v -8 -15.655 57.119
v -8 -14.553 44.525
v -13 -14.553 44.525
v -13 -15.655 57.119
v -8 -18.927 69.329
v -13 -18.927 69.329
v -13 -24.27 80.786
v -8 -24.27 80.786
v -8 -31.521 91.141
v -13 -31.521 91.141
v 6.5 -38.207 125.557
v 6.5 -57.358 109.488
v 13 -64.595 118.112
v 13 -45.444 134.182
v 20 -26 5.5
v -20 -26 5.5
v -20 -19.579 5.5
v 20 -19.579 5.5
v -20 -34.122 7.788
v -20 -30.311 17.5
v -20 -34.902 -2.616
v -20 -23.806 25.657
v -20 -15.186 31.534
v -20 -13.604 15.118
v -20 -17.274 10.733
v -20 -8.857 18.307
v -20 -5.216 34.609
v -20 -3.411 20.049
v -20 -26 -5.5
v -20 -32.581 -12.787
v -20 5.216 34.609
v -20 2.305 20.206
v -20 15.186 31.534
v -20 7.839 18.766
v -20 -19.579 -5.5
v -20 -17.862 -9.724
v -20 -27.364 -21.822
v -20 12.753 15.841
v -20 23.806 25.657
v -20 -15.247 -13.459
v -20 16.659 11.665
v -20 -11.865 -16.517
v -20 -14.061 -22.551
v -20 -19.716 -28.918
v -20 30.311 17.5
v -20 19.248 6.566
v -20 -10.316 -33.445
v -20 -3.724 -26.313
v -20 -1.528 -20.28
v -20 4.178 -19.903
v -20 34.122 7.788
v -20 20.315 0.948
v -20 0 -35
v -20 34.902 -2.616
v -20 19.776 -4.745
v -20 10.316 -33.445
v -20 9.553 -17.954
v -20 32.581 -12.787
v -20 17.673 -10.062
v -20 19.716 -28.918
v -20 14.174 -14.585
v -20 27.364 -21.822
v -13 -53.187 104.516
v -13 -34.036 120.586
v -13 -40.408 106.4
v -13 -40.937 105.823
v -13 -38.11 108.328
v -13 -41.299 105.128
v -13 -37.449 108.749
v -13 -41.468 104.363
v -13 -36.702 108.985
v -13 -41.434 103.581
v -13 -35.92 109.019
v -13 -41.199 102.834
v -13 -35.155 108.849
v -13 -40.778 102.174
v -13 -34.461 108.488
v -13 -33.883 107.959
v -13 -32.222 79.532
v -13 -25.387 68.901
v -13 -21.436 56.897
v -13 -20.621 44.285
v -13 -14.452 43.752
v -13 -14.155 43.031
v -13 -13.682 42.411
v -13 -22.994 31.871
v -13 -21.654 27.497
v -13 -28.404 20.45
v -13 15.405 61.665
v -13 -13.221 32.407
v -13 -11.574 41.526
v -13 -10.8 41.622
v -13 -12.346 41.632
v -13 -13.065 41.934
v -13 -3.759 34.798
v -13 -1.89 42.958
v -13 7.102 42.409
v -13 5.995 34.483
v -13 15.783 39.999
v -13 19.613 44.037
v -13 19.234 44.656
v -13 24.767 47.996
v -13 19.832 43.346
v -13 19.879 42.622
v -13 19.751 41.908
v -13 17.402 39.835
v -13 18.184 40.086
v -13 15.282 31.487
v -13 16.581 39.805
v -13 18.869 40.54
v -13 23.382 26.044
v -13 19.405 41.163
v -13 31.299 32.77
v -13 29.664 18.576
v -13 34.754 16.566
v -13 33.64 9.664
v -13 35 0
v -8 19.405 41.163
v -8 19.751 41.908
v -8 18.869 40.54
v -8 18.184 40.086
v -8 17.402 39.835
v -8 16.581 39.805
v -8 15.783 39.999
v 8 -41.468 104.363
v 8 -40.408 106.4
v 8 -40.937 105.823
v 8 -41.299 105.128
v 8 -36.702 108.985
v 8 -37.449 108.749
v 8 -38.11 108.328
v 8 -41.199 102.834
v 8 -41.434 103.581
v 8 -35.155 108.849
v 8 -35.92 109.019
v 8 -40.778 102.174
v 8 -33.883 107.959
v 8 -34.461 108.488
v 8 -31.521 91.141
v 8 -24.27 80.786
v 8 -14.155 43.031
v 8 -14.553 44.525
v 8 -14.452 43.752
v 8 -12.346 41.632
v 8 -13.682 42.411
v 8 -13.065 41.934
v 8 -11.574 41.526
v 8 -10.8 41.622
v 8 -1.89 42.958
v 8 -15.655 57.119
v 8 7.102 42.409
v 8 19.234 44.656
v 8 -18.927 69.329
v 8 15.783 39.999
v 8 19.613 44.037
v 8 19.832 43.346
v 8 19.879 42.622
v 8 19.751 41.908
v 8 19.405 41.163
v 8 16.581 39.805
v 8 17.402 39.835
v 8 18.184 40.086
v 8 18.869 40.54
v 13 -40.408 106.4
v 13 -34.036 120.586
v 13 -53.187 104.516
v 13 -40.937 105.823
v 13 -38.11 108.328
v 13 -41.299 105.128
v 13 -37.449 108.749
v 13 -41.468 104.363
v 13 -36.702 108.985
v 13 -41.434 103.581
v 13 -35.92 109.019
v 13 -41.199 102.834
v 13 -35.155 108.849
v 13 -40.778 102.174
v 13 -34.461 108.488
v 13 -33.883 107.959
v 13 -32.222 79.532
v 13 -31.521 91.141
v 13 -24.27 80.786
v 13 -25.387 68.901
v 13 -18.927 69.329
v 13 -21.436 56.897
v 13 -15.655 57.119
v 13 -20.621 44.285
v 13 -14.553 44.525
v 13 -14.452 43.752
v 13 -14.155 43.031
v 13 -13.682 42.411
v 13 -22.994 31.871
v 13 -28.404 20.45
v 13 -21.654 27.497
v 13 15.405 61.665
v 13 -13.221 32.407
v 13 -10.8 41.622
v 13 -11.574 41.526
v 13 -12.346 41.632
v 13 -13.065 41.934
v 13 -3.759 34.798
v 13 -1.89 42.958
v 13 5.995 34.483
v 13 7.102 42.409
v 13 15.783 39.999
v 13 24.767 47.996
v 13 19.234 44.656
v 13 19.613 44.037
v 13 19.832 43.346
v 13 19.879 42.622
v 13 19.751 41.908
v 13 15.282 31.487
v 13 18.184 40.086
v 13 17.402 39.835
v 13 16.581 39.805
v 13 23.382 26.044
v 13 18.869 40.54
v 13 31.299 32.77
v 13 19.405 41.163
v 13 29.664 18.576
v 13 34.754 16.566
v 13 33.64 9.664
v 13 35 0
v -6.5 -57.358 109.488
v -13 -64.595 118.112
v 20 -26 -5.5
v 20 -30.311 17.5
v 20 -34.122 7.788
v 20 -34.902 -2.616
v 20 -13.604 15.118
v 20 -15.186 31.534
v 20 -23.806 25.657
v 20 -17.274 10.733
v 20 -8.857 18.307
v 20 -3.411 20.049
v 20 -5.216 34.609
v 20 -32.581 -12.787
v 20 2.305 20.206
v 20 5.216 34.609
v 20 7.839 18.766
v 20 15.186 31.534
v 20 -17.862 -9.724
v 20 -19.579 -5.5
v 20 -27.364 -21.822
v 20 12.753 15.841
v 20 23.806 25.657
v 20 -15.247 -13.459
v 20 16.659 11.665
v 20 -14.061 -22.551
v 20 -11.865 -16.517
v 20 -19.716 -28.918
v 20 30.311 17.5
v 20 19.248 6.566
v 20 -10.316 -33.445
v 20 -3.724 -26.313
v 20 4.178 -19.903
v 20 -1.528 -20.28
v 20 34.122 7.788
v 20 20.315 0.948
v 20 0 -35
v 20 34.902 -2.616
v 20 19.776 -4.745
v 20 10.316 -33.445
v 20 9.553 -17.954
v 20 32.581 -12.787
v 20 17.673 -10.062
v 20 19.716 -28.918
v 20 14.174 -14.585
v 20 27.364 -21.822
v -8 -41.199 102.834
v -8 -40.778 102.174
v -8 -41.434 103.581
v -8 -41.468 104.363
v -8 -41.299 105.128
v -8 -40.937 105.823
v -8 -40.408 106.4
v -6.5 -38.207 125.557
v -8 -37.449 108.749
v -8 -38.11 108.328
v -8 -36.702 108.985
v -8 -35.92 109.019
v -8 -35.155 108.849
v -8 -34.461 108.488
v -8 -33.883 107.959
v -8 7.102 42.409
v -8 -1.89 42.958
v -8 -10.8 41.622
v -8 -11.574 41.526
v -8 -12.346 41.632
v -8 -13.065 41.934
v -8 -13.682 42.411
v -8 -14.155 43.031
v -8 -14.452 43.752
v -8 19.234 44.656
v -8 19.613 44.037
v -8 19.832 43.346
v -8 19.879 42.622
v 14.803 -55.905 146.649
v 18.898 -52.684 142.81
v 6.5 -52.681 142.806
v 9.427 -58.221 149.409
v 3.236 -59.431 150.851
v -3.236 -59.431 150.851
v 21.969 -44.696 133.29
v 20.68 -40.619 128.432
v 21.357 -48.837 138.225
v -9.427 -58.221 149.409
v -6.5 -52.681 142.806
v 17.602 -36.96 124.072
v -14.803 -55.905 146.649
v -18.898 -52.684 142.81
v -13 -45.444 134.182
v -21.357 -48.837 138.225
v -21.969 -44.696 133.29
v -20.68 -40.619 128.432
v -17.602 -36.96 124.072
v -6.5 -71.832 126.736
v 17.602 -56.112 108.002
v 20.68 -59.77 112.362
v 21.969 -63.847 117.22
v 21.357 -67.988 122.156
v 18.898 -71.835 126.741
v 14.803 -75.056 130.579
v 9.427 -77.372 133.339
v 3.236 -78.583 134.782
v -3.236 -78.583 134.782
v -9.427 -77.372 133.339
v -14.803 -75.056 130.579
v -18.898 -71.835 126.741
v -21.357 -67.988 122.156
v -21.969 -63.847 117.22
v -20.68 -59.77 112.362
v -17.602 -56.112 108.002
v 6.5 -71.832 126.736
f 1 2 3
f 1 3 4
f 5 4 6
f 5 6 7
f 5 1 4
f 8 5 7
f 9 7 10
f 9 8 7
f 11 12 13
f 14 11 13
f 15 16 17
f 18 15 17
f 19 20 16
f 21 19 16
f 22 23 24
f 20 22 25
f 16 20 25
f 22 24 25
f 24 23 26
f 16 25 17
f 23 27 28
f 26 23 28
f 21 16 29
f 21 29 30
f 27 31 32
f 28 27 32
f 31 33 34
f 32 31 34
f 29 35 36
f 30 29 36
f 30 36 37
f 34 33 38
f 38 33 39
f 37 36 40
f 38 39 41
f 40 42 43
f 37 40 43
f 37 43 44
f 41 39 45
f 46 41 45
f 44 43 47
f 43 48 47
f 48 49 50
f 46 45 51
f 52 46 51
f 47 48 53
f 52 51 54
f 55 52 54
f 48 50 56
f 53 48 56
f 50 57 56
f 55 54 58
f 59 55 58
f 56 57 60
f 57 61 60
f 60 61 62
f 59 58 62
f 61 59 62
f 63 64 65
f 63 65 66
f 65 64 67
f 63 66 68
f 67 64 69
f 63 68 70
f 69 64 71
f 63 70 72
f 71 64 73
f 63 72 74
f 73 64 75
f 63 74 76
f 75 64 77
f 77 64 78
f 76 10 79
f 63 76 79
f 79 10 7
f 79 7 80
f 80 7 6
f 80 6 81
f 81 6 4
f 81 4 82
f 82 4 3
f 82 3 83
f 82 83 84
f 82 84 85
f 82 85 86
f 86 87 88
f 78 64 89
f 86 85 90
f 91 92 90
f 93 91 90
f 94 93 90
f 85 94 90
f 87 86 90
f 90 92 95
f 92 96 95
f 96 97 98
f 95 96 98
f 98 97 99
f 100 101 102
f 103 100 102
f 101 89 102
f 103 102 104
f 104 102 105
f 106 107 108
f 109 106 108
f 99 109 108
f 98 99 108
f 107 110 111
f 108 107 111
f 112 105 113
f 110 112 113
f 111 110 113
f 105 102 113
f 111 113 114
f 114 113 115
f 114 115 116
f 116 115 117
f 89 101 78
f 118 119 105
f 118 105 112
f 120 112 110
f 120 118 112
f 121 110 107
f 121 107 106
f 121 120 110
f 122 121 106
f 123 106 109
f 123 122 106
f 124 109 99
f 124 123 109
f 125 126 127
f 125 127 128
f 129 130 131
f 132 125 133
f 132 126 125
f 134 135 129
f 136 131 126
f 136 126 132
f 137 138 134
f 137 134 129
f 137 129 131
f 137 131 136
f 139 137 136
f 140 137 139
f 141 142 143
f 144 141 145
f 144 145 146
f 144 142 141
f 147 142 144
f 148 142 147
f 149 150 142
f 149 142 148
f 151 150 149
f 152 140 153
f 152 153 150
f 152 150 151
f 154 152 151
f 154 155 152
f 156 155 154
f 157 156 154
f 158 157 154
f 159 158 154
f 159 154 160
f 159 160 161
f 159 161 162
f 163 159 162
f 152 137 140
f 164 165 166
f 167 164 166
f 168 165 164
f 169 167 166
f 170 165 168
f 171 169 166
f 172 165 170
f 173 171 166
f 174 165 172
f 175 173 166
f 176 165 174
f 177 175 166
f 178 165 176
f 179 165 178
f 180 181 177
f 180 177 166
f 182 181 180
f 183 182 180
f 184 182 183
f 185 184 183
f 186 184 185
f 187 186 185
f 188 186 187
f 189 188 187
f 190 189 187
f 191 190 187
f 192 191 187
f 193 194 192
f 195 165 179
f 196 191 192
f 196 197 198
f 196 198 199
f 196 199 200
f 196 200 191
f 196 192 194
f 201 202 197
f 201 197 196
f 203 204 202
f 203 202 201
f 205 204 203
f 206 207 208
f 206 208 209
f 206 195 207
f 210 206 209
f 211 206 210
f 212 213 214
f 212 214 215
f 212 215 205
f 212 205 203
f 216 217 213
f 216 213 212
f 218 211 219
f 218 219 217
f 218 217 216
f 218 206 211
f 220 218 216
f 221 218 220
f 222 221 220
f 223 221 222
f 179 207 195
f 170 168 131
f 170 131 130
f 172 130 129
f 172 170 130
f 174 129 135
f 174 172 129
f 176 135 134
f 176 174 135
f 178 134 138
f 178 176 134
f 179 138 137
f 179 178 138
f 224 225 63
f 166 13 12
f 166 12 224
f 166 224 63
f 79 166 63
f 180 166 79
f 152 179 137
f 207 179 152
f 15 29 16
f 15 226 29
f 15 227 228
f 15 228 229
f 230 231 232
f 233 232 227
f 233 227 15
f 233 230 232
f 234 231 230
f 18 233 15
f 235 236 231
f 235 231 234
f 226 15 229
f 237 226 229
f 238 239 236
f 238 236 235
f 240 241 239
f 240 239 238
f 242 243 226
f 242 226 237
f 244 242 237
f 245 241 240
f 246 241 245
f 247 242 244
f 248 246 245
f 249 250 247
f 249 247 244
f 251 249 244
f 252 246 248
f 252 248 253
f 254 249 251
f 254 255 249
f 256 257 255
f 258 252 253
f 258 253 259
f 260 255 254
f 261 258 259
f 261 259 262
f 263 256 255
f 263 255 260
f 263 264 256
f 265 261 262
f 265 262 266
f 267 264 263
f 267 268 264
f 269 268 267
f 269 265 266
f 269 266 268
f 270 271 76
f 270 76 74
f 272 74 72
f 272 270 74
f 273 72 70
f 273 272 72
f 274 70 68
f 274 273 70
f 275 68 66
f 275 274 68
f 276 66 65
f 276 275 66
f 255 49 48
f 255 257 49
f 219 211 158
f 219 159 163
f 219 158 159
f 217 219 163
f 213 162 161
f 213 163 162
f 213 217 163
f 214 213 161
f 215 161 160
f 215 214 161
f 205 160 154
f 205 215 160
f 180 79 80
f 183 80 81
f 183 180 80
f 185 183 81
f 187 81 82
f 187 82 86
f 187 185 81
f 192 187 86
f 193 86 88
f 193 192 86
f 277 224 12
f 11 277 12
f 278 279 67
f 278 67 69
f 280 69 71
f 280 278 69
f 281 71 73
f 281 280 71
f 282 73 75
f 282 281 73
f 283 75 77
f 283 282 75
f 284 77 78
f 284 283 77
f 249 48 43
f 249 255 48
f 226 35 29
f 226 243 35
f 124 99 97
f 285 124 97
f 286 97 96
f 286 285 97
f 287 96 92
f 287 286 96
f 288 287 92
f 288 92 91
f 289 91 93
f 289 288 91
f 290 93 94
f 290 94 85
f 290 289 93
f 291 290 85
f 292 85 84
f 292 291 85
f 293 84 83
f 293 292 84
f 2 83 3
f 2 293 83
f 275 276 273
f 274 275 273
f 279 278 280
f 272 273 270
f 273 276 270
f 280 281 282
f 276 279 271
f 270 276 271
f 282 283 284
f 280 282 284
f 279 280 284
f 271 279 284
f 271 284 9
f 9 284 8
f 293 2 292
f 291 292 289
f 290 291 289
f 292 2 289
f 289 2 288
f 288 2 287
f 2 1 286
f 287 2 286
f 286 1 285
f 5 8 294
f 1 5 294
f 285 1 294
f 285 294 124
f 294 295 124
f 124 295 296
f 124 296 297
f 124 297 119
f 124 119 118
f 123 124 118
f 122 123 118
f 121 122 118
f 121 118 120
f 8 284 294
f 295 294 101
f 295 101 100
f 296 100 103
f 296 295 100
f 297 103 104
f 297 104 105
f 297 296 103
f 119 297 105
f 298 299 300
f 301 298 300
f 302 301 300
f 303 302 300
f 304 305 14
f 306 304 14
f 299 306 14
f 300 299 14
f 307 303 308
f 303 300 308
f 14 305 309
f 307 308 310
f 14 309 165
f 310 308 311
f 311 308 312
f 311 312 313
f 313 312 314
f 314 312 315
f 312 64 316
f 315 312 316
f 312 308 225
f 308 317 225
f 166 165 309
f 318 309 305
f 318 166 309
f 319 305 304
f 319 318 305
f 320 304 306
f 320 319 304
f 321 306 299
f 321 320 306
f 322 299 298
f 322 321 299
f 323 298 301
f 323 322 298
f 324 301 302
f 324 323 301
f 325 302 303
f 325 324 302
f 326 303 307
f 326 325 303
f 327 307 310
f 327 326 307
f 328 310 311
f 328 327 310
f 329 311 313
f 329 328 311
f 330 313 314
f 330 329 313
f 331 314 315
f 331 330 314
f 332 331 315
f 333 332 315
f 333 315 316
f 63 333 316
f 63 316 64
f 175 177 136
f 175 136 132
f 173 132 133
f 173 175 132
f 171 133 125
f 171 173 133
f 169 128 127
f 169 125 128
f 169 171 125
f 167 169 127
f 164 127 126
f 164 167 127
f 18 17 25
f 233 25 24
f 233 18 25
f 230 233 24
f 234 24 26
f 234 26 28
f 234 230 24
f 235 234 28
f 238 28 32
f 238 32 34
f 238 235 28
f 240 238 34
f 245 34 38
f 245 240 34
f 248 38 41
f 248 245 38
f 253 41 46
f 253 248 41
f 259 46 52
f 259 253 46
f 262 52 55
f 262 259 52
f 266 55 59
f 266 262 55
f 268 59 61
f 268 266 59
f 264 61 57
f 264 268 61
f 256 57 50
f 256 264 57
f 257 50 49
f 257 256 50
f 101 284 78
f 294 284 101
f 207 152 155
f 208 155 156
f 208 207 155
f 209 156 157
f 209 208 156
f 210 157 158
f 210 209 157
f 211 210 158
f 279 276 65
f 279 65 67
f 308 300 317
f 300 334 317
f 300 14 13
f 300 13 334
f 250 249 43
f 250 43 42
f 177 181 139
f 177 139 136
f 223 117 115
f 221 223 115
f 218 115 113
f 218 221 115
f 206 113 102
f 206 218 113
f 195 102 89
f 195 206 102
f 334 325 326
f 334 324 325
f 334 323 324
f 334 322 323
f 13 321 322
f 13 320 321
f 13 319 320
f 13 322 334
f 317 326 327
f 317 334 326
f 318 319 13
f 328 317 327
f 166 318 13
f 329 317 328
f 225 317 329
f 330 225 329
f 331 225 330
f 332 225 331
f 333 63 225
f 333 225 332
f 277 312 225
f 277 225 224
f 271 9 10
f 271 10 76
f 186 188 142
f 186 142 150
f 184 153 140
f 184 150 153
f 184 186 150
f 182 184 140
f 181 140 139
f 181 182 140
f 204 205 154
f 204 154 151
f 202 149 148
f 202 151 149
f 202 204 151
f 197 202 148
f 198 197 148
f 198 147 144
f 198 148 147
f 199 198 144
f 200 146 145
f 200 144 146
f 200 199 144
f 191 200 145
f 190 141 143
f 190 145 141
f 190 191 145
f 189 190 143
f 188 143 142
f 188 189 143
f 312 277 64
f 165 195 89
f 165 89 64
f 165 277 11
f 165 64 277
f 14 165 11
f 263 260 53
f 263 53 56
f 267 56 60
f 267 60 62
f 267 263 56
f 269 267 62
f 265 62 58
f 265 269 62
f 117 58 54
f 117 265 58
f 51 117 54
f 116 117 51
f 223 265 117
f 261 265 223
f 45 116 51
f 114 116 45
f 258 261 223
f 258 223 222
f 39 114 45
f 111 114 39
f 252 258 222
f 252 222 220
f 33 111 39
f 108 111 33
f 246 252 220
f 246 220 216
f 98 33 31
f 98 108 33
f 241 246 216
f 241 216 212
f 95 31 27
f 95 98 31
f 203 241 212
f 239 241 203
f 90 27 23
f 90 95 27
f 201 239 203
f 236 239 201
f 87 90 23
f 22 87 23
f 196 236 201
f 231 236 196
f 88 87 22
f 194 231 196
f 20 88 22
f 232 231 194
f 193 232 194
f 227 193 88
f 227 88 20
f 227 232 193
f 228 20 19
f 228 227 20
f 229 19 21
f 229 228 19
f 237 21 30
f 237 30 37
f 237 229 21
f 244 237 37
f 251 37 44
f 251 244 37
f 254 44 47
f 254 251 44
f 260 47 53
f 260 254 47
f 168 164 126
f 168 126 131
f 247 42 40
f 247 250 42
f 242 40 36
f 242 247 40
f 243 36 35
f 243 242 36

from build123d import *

# Parameters (mm, degrees)
BOSS_EXTRUDE2_DEPTH = 13
BOSS_EXTRUDE3_DEPTH = 20
BOSS_EXTRUDE4_DEPTH = 8
SKETCH2_R           = 22
BOSS_EXTRUDE5_DEPTH = 12.5
CUT_EXTRUDE1_DEPTH  = 12.5


with BuildPart() as part:
    # Sketch1 → Boss-Extrude2 (new, symmetric)
    with BuildSketch(Plane(origin=(0, 0, 0), x_dir=(0, 0, -1), z_dir=(1, 0, 0))):
        with BuildLine():
            ThreePointArc((0, 35), (-32.769963209, 31.299429366), (-61.665057093, 15.404830876))
            Line((-61.665057093, 15.404830876), (-134.181781084, -45.443925478))
            Line((-134.181781084, -45.443925478), (-118.112090842, -64.595036556))
            Line((-118.112090842, -64.595036556), (-79.531665184, -32.222215616))
            ThreePointArc((-79.531665184, -32.222215616), (-50.616442429, -20.628497988), (-20.449595974, -28.40447191))
            ThreePointArc((-20.449595974, -28.40447191), (-33.310332608, 10.743451102), (0, 35))
        make_face()
        with BuildLine():
            Line((-107.958660037, -33.883372594), (-44.65586319, 19.233980892))
            ThreePointArc((-44.65586319, 19.233980892), (-43.34571286, 19.832159244), (-41.9077315, 19.751407541))
            ThreePointArc((-41.9077315, 19.751407541), (-40.085906415, 18.184292753), (-39.998801846, 15.782770696))
            ThreePointArc((-39.998801846, 15.782770696), (-42.92008559, 2.620353591), (-41.621711579, -10.799681718))
            ThreePointArc((-41.621711579, -10.799681718), (-42.152723603, -13.388818271), (-44.52547273, -14.553147883))
            ThreePointArc((-44.52547273, -14.553147883), (-69.329263161, -18.927231696), (-91.141343442, -31.520634046))
            Line((-91.141343442, -31.520634046), (-102.17357155, -40.777772582))
            ThreePointArc((-102.17357155, -40.777772582), (-104.363401607, -41.468223347), (-106.400067708, -40.408002082))
            Line((-106.400067708, -40.408002082), (-108.328430537, -38.109868752))
            ThreePointArc((-108.328430537, -38.109868752), (-109.018881302, -35.920038695), (-107.958660037, -33.883372594))
        make_face(mode=Mode.SUBTRACT)
    extrude(amount=BOSS_EXTRUDE2_DEPTH, both=True)

    # Sketch1<4> → Boss-Extrude3 (add, symmetric)
    with BuildSketch(Plane(origin=(0, 0, 0), x_dir=(0, 0, -1), z_dir=(1, 0, 0))):
        with BuildLine():
            ThreePointArc((35, 0), (24.748737342, 24.748737342), (0, 35))
            ThreePointArc((0, 35), (-33.310332608, 10.743451102), (-20.449595974, -28.40447191))
            ThreePointArc((-20.449595974, -28.40447191), (15.957194943, -31.150729198), (35, 0))
        make_face()
        with BuildLine():
            Line((26.313118929, -3.724214312), (22.550897352, -14.060833141))
            Line((22.550897352, -14.060833141), (16.517461106, -11.864841937))
            ThreePointArc((16.517461106, -11.864841937), (11.664928714, -16.659244691), (5.5, -19.579351255))
            Line((5.5, -19.579351255), (5.5, -26))
            Line((5.5, -26), (-5.5, -26))
            Line((-5.5, -26), (-5.5, -19.579351255))
            ThreePointArc((-5.5, -19.579351255), (-11.664928714, 16.659244691), (20.279682682, -1.528223108))
            Line((20.279682682, -1.528223108), (26.313118929, -3.724214312))
        make_face(mode=Mode.SUBTRACT)
    extrude(amount=BOSS_EXTRUDE3_DEPTH, both=True)

    # Sketch1<5> → Boss-Extrude4 (add, symmetric)
    with BuildSketch(Plane(origin=(0, 0, 0), x_dir=(0, 0, -1), z_dir=(1, 0, 0))):
        with BuildLine():
            ThreePointArc((-41.9077315, 19.751407541), (-43.34571286, 19.832159244), (-44.65586319, 19.233980892))
            Line((-44.65586319, 19.233980892), (-107.958660037, -33.883372594))
            ThreePointArc((-107.958660037, -33.883372594), (-109.018881302, -35.920038695), (-108.328430537, -38.109868752))
            Line((-108.328430537, -38.109868752), (-106.400067708, -40.408002082))
            ThreePointArc((-106.400067708, -40.408002082), (-104.363401607, -41.468223347), (-102.17357155, -40.777772582))
            Line((-102.17357155, -40.777772582), (-91.141343442, -31.520634046))
            ThreePointArc((-91.141343442, -31.520634046), (-69.329263161, -18.927231696), (-44.52547273, -14.553147883))
            ThreePointArc((-44.52547273, -14.553147883), (-42.152723603, -13.388818271), (-41.621711579, -10.799681718))
            ThreePointArc((-41.621711579, -10.799681718), (-42.92008559, 2.620353591), (-39.998801846, 15.782770696))
            ThreePointArc((-39.998801846, 15.782770696), (-40.085906415, 18.184292753), (-41.9077315, 19.751407541))
        make_face()
    extrude(amount=BOSS_EXTRUDE4_DEPTH, both=True)

    # Sketch2 → Boss-Extrude5 (add, symmetric)
    with BuildSketch(Plane(origin=(0, 29.828483461, 25.029069471), x_dir=(-1, 0, 0), z_dir=(0, -0.7660444431189768, -0.6427876096865408))):
        with Locations((0, -132)):
            Circle(SKETCH2_R)
        Polygon((6.5, -120.741669751), (-6.5, -120.741669751), (-13, -132), (-6.5, -143.258330249), (6.5, -143.258330249), (13, -132), align=None, mode=Mode.SUBTRACT)
    extrude(amount=BOSS_EXTRUDE5_DEPTH, both=True)

    # Sketch2<2> → Cut-Extrude1 (cut, symmetric)
    with BuildSketch(Plane(origin=(0, 29.828483461, 25.029069471), x_dir=(-1, 0, 0), z_dir=(0, -0.7660444431189768, -0.6427876096865408))):
        Polygon((13, -132), (6.5, -120.741669751), (-6.5, -120.741669751), (-13, -132), (-6.5, -143.258330249), (6.5, -143.258330249), align=None)
    extrude(amount=CUT_EXTRUDE1_DEPTH, both=True, mode=Mode.SUBTRACT)


solid = part.part
